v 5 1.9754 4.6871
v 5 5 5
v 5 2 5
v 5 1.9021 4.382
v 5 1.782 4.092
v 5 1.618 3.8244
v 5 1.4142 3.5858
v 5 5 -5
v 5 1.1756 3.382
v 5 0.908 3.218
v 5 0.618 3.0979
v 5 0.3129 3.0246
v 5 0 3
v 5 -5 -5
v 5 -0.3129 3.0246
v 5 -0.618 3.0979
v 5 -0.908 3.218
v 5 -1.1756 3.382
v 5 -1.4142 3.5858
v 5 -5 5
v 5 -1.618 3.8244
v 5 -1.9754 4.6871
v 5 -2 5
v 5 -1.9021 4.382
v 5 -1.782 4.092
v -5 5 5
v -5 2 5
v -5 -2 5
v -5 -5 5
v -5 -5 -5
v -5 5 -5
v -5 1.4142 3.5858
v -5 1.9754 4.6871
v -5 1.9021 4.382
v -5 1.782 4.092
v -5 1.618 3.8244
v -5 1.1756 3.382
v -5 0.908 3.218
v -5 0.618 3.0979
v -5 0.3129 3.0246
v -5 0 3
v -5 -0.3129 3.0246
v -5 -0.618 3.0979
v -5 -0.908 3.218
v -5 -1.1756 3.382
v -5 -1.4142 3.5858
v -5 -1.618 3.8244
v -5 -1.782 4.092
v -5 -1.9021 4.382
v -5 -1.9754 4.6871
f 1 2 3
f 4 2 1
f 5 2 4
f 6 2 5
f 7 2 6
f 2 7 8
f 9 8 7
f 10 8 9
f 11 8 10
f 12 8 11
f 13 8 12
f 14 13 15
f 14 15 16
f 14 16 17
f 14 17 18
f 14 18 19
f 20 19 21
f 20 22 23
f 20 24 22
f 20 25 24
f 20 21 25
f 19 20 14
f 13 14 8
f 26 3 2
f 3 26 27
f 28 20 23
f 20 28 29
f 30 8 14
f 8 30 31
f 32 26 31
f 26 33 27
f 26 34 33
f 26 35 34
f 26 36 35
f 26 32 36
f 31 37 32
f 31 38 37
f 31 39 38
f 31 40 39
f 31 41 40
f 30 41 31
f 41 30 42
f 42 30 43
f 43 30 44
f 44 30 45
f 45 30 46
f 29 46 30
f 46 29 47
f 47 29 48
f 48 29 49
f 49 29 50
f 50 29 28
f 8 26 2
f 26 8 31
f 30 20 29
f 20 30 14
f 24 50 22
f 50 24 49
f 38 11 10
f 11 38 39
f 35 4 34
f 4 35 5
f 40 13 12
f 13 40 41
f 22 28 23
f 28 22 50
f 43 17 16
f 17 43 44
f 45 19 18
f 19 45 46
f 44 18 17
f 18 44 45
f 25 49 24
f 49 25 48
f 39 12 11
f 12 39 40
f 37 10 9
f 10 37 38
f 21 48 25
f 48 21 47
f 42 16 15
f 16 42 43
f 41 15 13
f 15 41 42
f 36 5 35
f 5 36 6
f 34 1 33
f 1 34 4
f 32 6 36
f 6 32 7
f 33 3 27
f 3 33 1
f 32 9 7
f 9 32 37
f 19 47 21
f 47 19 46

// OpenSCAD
// See http://en.wikibooks.org/wiki/OpenSCAD_User_Manual/The_OpenSCAD_Language#Modifier_Characters
// Simply ignore this entire subtree.
// Usage
//   * { ... }

difference() {
	cube(10, center = true);
	translate([0, 0, 5]) {
		rotate([0, 90, 0]) {
			cylinder(r = 2, h = 20, center = true, $fn = 40);
		}
		*rotate([90, 0, 0]) {
			#cylinder(r = 2, h = 20, center = true, $fn = 40);
		}
	}
}
